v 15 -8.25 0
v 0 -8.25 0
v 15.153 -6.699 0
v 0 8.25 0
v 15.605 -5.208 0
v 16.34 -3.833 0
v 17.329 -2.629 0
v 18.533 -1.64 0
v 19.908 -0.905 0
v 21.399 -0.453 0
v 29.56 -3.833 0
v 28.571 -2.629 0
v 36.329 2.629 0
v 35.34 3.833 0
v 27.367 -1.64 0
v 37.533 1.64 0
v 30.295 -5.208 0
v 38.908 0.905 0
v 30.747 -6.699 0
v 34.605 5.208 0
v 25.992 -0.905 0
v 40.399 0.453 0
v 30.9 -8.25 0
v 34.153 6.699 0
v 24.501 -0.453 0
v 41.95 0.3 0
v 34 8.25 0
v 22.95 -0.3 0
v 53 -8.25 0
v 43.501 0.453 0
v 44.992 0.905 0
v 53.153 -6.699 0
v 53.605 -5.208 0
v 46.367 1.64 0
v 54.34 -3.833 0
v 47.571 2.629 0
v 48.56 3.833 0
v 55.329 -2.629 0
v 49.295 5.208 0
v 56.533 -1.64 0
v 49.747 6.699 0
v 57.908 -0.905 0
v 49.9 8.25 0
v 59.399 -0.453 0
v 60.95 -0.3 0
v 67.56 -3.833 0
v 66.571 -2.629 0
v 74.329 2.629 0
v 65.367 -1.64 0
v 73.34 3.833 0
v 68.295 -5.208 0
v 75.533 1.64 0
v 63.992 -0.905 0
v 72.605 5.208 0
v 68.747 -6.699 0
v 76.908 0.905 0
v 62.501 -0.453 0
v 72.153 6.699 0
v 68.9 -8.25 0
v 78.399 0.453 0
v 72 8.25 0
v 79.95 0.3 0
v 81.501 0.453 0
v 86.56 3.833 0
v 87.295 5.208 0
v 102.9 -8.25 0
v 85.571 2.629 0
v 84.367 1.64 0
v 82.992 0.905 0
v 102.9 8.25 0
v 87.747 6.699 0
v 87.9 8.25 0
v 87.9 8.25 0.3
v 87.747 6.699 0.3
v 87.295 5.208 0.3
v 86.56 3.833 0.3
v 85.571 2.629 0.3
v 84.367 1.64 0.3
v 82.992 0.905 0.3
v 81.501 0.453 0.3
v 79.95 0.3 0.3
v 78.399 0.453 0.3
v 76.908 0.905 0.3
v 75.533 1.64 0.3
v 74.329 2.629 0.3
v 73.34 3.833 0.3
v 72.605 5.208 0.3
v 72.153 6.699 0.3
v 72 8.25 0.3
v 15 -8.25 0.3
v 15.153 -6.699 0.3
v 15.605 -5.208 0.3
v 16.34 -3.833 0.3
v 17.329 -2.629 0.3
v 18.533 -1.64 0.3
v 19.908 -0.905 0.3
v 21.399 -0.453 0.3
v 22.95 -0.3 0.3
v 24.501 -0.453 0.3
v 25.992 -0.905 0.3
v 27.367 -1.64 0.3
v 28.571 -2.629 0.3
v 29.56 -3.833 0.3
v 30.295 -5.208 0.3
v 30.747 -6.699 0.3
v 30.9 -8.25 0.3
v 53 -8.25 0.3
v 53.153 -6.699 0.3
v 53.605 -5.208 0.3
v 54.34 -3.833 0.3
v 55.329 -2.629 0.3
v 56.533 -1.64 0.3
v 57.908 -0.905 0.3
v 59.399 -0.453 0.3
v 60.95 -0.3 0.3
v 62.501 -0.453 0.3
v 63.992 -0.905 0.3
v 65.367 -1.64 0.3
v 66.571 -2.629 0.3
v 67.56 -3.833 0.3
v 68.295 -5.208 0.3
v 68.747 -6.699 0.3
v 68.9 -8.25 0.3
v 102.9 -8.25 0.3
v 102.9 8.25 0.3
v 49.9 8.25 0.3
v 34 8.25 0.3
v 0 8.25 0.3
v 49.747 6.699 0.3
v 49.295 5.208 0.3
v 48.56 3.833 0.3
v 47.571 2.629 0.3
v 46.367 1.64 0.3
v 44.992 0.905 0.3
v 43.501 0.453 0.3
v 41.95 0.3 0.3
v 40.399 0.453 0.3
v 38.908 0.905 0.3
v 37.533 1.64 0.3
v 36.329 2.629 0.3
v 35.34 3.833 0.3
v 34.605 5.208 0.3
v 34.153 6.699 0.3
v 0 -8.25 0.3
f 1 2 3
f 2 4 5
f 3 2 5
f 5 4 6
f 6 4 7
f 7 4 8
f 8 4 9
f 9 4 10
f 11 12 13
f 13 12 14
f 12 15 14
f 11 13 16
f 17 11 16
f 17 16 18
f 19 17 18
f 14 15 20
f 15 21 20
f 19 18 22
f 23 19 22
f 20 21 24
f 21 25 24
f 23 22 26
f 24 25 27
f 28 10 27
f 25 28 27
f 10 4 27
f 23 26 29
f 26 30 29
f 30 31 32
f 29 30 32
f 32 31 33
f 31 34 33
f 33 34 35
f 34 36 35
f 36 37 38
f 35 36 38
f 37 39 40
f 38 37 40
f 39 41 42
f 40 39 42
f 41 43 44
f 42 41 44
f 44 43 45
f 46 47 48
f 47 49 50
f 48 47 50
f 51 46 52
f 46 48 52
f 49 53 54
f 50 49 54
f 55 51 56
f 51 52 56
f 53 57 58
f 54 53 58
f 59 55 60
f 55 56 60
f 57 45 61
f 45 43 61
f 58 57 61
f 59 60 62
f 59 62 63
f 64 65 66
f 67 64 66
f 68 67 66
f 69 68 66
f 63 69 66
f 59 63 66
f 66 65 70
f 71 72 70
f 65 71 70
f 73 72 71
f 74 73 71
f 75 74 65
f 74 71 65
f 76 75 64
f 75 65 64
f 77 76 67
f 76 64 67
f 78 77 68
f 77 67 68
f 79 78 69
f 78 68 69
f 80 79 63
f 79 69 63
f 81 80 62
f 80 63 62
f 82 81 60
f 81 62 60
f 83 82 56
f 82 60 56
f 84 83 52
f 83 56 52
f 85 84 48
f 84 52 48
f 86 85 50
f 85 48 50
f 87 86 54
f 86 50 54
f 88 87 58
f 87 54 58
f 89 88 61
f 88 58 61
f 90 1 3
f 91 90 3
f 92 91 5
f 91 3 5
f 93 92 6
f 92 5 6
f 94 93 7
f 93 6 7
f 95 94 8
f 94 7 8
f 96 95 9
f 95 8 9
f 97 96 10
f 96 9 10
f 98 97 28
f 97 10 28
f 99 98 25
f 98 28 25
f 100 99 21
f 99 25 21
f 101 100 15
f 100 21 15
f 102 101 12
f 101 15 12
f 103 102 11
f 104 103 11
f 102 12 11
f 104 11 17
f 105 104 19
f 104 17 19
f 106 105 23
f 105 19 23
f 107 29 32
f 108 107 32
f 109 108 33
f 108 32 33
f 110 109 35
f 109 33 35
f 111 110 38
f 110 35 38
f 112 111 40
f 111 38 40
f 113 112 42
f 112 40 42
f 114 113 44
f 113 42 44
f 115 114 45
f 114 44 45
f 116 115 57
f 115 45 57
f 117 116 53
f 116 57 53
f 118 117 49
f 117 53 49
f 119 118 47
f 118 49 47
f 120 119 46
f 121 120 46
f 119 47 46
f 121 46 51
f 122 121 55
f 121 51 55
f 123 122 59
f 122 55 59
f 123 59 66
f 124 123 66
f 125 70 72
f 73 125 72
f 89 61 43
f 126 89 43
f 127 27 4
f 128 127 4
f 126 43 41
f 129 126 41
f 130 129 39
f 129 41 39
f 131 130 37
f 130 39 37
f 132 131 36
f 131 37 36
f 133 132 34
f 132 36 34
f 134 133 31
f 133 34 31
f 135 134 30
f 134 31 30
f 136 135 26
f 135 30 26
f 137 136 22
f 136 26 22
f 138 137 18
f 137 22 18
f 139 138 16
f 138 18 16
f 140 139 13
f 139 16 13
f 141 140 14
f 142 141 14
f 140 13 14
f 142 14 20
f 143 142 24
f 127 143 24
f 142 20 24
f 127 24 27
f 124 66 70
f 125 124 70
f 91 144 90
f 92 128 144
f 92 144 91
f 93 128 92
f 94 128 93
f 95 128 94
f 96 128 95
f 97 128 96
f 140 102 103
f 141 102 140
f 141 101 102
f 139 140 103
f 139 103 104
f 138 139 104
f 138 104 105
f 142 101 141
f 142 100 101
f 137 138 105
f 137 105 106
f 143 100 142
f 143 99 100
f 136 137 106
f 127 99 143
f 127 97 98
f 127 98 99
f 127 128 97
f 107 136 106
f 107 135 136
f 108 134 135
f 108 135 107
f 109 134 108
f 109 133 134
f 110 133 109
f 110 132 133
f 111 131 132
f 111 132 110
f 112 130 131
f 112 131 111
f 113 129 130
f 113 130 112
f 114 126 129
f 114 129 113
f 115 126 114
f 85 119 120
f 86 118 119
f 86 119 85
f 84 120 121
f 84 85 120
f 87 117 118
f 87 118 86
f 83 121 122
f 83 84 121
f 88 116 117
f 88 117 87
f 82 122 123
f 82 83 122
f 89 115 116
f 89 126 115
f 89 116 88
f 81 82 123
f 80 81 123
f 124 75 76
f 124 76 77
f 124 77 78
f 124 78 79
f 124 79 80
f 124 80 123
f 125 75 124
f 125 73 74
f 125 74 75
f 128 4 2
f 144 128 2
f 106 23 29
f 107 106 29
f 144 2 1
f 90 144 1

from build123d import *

# Parameters (mm, degrees)
F1_DEPTH = 0.3


with BuildPart() as f1:
    # F0 (on Top) → F1 (new body)
    with BuildSketch(Plane.XY):
        with BuildLine():
            ThreePointArc((53, -8.25), (60.95, -0.3), (68.9, -8.25))
            Line((68.9, -8.25), (102.9, -8.25))
            Line((102.9, -8.25), (102.9, 8.25))
            Line((102.9, 8.25), (87.9, 8.25))
            ThreePointArc((87.9, 8.25), (79.95, 0.3), (72, 8.25))
            Line((72, 8.25), (49.9, 8.25))
            ThreePointArc((49.9, 8.25), (41.95, 0.3), (34, 8.25))
            Line((34, 8.25), (0, 8.25))
            Line((0, 8.25), (0, -8.25))
            Line((0, -8.25), (15, -8.25))
            ThreePointArc((15, -8.25), (22.95, -0.3), (30.9, -8.25))
            Line((30.9, -8.25), (53, -8.25))
        make_face()
    extrude(amount=F1_DEPTH)


solid = f1.part
